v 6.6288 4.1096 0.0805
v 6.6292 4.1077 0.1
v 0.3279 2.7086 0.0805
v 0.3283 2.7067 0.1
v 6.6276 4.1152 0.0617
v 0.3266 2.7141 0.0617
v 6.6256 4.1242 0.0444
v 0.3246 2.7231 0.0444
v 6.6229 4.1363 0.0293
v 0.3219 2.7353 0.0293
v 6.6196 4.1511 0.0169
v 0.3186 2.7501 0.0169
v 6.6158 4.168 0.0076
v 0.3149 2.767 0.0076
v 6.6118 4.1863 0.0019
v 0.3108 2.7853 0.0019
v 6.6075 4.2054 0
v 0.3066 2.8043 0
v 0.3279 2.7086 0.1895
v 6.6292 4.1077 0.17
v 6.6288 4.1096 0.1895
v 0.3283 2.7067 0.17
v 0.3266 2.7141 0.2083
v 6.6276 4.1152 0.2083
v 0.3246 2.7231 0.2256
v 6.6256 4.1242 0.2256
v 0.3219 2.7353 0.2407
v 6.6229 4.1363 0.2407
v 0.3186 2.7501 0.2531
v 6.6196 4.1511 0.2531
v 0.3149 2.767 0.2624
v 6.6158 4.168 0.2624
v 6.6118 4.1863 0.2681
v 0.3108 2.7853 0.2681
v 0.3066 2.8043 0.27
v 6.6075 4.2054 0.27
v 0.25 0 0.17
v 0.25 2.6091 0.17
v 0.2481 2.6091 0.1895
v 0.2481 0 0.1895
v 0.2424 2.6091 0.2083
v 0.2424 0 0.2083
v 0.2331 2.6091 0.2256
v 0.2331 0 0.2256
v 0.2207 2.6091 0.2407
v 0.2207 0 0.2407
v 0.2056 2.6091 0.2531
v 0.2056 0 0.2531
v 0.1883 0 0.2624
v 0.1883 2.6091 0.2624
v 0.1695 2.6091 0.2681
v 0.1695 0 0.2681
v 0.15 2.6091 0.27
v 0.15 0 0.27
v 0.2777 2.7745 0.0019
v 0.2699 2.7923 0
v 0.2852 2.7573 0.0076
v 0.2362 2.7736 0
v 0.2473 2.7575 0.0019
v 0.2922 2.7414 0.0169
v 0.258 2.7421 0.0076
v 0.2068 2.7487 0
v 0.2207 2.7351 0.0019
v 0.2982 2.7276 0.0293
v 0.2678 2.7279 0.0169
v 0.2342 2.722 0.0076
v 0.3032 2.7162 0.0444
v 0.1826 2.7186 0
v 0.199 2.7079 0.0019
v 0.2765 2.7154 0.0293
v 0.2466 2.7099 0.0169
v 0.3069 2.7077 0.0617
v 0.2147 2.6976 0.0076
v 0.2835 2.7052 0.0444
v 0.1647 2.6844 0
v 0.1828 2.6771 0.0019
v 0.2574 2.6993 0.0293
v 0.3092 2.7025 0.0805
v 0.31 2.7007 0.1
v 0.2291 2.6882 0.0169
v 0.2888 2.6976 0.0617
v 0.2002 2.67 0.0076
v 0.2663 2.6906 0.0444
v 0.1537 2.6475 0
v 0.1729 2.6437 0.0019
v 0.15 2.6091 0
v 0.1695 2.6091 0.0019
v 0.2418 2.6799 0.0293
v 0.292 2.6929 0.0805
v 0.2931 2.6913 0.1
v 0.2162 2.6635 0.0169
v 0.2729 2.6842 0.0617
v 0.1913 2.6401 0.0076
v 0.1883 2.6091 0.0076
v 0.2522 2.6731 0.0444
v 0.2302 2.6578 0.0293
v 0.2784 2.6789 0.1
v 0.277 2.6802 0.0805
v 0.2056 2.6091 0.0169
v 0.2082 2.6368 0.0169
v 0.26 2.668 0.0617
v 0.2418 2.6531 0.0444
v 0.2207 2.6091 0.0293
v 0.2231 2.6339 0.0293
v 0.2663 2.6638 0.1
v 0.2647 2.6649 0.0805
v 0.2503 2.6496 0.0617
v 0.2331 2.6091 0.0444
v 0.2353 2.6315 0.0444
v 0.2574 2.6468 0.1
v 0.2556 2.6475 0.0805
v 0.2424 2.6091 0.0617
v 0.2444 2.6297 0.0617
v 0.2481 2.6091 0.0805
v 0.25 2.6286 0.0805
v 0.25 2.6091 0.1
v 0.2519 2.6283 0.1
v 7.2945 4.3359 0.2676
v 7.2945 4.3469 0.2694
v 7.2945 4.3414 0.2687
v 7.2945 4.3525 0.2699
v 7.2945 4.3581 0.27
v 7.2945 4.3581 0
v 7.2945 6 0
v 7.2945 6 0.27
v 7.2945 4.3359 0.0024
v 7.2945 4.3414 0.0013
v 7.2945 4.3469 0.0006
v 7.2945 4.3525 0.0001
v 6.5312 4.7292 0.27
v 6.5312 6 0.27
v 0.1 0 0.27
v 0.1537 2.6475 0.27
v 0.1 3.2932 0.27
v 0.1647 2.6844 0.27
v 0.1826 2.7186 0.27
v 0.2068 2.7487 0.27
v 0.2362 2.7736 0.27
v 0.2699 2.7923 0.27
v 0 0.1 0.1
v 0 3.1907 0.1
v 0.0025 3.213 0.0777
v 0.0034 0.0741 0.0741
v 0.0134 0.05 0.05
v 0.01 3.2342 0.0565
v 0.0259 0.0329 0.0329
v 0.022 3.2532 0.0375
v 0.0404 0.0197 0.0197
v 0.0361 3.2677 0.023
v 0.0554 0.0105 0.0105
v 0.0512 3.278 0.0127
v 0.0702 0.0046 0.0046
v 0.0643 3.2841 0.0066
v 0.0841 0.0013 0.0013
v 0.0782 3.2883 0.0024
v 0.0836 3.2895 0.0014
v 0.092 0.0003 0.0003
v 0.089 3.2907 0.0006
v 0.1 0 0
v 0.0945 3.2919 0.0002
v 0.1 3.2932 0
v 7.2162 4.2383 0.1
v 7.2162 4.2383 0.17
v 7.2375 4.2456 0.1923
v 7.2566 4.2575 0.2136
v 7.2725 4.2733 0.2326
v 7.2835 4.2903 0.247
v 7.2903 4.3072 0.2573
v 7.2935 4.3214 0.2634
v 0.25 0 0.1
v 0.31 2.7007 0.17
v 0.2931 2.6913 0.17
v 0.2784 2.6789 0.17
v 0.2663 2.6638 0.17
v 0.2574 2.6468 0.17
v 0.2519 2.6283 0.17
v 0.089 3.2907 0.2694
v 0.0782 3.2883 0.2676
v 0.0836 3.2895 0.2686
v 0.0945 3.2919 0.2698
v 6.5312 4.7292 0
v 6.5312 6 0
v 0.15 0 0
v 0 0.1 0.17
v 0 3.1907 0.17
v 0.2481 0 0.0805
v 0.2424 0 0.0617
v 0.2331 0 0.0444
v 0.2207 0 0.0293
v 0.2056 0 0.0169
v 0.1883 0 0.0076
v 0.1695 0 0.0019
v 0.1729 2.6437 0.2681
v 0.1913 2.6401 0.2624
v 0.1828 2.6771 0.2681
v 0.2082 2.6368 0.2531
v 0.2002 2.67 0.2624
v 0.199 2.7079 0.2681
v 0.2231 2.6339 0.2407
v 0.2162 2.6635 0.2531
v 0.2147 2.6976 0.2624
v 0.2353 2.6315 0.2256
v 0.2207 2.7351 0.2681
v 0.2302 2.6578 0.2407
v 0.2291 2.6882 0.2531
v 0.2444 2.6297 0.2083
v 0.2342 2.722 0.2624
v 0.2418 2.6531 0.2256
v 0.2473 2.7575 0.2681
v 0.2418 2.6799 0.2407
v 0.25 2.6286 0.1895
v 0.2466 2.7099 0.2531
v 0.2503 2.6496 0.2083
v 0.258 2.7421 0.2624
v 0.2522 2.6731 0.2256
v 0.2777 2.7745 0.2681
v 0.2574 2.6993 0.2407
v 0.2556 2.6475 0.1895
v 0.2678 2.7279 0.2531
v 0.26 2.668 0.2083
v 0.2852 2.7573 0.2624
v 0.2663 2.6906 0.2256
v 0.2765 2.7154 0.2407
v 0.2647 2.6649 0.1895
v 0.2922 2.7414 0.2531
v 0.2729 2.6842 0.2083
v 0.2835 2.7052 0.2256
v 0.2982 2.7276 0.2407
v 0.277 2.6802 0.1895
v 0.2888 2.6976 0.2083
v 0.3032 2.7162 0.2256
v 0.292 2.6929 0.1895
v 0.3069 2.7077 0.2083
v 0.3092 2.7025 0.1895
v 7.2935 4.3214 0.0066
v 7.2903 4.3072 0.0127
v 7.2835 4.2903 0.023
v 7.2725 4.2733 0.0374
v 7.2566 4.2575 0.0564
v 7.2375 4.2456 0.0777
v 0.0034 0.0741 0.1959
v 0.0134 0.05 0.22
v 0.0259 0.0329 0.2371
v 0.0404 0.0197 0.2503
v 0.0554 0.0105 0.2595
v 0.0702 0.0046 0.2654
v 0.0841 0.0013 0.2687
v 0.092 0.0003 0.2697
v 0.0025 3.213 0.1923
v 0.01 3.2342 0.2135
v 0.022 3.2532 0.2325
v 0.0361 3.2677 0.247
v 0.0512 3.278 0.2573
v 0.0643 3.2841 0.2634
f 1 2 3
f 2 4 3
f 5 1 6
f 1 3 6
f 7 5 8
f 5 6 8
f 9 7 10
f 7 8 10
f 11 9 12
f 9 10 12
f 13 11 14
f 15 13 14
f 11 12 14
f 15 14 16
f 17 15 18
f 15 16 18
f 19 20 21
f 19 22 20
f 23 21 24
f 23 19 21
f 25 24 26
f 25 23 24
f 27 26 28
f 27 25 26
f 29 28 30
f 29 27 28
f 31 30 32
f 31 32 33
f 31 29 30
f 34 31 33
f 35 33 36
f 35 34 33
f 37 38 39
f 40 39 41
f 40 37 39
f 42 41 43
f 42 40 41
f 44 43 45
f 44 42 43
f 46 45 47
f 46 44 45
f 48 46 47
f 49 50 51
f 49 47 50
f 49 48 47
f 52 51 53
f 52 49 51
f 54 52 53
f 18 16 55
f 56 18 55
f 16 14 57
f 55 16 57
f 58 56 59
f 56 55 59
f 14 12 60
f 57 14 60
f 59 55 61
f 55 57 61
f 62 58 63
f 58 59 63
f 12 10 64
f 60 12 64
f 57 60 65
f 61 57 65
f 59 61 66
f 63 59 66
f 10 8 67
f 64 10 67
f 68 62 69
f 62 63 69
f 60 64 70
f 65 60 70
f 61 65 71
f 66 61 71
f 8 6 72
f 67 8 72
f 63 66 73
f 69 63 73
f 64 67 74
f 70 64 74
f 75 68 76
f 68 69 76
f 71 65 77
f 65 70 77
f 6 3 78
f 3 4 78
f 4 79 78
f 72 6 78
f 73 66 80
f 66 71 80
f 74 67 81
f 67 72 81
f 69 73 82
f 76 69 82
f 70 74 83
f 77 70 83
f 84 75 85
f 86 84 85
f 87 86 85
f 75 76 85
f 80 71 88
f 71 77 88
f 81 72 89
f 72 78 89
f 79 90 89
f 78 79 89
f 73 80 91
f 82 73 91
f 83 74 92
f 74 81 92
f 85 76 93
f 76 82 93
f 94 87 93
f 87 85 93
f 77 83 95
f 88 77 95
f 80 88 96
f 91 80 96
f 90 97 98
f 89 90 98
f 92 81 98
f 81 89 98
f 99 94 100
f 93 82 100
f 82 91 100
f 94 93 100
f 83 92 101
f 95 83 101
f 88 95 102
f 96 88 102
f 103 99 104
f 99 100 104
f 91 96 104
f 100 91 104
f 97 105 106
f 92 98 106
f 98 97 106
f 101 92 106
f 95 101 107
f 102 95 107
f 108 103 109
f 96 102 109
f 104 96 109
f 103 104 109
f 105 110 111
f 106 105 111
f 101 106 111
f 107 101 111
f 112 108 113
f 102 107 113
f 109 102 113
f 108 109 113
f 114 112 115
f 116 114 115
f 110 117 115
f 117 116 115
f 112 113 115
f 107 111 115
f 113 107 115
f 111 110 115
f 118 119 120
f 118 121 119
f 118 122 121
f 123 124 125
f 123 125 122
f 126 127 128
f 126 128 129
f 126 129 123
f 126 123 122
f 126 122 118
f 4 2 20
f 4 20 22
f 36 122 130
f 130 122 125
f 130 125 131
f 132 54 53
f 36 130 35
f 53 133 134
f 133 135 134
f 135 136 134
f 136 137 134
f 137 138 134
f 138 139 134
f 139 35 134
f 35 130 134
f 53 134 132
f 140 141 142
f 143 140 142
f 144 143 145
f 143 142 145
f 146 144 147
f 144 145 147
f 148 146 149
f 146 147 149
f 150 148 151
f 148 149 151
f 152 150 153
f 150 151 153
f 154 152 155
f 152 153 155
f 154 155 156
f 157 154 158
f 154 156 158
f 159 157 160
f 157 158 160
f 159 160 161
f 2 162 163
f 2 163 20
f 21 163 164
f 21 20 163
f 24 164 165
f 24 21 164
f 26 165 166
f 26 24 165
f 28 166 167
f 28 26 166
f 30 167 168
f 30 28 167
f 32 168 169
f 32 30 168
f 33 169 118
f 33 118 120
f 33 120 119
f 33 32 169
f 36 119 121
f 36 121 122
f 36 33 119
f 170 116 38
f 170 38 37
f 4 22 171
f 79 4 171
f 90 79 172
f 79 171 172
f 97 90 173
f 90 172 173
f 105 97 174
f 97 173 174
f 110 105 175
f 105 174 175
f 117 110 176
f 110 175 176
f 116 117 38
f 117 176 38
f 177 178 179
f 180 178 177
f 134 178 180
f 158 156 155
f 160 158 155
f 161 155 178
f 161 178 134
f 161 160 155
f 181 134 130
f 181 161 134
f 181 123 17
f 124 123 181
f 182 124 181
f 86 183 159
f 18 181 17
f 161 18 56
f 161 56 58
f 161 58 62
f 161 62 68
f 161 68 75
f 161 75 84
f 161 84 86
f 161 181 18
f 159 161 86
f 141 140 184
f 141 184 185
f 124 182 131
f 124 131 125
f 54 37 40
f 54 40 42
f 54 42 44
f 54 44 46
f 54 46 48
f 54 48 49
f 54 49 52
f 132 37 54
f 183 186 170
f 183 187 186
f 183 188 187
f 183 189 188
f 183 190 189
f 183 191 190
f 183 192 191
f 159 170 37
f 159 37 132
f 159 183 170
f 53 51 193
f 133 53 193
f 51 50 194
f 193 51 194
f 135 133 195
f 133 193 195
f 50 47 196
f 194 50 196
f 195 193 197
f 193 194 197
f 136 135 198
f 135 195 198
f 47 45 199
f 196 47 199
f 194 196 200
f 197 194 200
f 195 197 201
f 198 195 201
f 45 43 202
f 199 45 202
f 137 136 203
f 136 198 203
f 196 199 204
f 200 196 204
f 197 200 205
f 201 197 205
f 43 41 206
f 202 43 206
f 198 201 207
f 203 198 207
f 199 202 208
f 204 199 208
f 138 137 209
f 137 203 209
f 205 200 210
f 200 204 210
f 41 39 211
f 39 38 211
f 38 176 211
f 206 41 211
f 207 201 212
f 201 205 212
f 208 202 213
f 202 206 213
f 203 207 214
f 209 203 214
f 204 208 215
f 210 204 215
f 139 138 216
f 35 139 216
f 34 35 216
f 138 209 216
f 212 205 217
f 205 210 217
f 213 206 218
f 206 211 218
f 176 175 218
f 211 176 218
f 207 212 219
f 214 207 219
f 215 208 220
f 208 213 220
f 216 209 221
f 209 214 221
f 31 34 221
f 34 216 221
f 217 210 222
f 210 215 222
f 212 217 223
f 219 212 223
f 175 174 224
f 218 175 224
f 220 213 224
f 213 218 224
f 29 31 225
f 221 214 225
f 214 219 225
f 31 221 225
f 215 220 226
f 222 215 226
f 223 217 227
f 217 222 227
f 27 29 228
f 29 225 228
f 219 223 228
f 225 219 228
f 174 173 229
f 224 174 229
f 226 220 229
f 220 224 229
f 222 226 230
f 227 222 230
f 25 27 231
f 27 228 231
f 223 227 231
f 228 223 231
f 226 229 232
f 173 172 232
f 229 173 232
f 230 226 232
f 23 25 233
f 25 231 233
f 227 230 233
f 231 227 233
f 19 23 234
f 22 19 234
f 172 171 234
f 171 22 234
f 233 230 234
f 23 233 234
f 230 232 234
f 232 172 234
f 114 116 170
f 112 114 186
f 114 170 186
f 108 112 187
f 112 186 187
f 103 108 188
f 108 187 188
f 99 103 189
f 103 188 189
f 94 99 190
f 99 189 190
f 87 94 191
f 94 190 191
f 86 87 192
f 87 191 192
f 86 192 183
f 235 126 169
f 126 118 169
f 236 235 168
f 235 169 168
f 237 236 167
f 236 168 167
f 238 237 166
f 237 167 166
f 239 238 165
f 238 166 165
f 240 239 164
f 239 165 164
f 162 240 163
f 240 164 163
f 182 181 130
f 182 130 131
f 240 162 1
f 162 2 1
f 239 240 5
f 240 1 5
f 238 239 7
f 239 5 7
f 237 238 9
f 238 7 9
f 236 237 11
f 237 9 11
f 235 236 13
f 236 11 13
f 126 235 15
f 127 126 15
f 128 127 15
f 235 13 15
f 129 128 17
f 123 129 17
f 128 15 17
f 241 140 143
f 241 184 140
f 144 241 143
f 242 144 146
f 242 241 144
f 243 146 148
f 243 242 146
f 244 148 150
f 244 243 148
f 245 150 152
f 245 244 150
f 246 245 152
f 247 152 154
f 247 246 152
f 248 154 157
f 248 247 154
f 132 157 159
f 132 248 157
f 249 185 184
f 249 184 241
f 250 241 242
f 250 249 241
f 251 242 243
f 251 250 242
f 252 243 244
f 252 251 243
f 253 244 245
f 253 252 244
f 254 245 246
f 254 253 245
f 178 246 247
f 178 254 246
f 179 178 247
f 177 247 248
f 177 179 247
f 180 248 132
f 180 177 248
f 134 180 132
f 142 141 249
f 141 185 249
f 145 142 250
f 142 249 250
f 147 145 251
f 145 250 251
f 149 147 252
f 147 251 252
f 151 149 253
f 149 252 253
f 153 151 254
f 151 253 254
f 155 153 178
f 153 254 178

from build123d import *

# Parameters (mm, degrees)
RESSALTO_EXTRUS_O1_DEPTH = 0.27
FILETE5_R                = 0.1


with BuildPart() as part:
    # Esboço1 → Ressalto-extrusão1 (new body)
    with BuildSketch(Plane.XY):
        Polygon((0, 0), (0, 3.270833333), (6.53125, 4.729166667), (6.53125, 6), (7.294533781, 6), (7.294533781, 4.255670993), (6.629245544, 4.107740982), (0.25, 2.689285325), (0.25, 0), align=None)
    extrude(amount=RESSALTO_EXTRUS_O1_DEPTH)

    # Filete5
    filete5_edges = [part.edges().sort_by_distance(p)[0] for p in [
        (3.772266891, 3.472478159, 0.27),
        (3.772266891, 3.472478159, 0),
        (0.25, 1.344642663, 0),
        (0, 0, 0.135),
        (0, 3.270833333, 0.135),
        (7.294533781, 4.255670993, 0.135),
        (0.25, 2.689285325, 0.135),
        (0, 1.635416667, 0.27),
        (0.25, 1.344642663, 0.27),
        (0, 1.635416667, 0),
    ]]
    fillet(filete5_edges, radius=FILETE5_R)


solid = part.part
